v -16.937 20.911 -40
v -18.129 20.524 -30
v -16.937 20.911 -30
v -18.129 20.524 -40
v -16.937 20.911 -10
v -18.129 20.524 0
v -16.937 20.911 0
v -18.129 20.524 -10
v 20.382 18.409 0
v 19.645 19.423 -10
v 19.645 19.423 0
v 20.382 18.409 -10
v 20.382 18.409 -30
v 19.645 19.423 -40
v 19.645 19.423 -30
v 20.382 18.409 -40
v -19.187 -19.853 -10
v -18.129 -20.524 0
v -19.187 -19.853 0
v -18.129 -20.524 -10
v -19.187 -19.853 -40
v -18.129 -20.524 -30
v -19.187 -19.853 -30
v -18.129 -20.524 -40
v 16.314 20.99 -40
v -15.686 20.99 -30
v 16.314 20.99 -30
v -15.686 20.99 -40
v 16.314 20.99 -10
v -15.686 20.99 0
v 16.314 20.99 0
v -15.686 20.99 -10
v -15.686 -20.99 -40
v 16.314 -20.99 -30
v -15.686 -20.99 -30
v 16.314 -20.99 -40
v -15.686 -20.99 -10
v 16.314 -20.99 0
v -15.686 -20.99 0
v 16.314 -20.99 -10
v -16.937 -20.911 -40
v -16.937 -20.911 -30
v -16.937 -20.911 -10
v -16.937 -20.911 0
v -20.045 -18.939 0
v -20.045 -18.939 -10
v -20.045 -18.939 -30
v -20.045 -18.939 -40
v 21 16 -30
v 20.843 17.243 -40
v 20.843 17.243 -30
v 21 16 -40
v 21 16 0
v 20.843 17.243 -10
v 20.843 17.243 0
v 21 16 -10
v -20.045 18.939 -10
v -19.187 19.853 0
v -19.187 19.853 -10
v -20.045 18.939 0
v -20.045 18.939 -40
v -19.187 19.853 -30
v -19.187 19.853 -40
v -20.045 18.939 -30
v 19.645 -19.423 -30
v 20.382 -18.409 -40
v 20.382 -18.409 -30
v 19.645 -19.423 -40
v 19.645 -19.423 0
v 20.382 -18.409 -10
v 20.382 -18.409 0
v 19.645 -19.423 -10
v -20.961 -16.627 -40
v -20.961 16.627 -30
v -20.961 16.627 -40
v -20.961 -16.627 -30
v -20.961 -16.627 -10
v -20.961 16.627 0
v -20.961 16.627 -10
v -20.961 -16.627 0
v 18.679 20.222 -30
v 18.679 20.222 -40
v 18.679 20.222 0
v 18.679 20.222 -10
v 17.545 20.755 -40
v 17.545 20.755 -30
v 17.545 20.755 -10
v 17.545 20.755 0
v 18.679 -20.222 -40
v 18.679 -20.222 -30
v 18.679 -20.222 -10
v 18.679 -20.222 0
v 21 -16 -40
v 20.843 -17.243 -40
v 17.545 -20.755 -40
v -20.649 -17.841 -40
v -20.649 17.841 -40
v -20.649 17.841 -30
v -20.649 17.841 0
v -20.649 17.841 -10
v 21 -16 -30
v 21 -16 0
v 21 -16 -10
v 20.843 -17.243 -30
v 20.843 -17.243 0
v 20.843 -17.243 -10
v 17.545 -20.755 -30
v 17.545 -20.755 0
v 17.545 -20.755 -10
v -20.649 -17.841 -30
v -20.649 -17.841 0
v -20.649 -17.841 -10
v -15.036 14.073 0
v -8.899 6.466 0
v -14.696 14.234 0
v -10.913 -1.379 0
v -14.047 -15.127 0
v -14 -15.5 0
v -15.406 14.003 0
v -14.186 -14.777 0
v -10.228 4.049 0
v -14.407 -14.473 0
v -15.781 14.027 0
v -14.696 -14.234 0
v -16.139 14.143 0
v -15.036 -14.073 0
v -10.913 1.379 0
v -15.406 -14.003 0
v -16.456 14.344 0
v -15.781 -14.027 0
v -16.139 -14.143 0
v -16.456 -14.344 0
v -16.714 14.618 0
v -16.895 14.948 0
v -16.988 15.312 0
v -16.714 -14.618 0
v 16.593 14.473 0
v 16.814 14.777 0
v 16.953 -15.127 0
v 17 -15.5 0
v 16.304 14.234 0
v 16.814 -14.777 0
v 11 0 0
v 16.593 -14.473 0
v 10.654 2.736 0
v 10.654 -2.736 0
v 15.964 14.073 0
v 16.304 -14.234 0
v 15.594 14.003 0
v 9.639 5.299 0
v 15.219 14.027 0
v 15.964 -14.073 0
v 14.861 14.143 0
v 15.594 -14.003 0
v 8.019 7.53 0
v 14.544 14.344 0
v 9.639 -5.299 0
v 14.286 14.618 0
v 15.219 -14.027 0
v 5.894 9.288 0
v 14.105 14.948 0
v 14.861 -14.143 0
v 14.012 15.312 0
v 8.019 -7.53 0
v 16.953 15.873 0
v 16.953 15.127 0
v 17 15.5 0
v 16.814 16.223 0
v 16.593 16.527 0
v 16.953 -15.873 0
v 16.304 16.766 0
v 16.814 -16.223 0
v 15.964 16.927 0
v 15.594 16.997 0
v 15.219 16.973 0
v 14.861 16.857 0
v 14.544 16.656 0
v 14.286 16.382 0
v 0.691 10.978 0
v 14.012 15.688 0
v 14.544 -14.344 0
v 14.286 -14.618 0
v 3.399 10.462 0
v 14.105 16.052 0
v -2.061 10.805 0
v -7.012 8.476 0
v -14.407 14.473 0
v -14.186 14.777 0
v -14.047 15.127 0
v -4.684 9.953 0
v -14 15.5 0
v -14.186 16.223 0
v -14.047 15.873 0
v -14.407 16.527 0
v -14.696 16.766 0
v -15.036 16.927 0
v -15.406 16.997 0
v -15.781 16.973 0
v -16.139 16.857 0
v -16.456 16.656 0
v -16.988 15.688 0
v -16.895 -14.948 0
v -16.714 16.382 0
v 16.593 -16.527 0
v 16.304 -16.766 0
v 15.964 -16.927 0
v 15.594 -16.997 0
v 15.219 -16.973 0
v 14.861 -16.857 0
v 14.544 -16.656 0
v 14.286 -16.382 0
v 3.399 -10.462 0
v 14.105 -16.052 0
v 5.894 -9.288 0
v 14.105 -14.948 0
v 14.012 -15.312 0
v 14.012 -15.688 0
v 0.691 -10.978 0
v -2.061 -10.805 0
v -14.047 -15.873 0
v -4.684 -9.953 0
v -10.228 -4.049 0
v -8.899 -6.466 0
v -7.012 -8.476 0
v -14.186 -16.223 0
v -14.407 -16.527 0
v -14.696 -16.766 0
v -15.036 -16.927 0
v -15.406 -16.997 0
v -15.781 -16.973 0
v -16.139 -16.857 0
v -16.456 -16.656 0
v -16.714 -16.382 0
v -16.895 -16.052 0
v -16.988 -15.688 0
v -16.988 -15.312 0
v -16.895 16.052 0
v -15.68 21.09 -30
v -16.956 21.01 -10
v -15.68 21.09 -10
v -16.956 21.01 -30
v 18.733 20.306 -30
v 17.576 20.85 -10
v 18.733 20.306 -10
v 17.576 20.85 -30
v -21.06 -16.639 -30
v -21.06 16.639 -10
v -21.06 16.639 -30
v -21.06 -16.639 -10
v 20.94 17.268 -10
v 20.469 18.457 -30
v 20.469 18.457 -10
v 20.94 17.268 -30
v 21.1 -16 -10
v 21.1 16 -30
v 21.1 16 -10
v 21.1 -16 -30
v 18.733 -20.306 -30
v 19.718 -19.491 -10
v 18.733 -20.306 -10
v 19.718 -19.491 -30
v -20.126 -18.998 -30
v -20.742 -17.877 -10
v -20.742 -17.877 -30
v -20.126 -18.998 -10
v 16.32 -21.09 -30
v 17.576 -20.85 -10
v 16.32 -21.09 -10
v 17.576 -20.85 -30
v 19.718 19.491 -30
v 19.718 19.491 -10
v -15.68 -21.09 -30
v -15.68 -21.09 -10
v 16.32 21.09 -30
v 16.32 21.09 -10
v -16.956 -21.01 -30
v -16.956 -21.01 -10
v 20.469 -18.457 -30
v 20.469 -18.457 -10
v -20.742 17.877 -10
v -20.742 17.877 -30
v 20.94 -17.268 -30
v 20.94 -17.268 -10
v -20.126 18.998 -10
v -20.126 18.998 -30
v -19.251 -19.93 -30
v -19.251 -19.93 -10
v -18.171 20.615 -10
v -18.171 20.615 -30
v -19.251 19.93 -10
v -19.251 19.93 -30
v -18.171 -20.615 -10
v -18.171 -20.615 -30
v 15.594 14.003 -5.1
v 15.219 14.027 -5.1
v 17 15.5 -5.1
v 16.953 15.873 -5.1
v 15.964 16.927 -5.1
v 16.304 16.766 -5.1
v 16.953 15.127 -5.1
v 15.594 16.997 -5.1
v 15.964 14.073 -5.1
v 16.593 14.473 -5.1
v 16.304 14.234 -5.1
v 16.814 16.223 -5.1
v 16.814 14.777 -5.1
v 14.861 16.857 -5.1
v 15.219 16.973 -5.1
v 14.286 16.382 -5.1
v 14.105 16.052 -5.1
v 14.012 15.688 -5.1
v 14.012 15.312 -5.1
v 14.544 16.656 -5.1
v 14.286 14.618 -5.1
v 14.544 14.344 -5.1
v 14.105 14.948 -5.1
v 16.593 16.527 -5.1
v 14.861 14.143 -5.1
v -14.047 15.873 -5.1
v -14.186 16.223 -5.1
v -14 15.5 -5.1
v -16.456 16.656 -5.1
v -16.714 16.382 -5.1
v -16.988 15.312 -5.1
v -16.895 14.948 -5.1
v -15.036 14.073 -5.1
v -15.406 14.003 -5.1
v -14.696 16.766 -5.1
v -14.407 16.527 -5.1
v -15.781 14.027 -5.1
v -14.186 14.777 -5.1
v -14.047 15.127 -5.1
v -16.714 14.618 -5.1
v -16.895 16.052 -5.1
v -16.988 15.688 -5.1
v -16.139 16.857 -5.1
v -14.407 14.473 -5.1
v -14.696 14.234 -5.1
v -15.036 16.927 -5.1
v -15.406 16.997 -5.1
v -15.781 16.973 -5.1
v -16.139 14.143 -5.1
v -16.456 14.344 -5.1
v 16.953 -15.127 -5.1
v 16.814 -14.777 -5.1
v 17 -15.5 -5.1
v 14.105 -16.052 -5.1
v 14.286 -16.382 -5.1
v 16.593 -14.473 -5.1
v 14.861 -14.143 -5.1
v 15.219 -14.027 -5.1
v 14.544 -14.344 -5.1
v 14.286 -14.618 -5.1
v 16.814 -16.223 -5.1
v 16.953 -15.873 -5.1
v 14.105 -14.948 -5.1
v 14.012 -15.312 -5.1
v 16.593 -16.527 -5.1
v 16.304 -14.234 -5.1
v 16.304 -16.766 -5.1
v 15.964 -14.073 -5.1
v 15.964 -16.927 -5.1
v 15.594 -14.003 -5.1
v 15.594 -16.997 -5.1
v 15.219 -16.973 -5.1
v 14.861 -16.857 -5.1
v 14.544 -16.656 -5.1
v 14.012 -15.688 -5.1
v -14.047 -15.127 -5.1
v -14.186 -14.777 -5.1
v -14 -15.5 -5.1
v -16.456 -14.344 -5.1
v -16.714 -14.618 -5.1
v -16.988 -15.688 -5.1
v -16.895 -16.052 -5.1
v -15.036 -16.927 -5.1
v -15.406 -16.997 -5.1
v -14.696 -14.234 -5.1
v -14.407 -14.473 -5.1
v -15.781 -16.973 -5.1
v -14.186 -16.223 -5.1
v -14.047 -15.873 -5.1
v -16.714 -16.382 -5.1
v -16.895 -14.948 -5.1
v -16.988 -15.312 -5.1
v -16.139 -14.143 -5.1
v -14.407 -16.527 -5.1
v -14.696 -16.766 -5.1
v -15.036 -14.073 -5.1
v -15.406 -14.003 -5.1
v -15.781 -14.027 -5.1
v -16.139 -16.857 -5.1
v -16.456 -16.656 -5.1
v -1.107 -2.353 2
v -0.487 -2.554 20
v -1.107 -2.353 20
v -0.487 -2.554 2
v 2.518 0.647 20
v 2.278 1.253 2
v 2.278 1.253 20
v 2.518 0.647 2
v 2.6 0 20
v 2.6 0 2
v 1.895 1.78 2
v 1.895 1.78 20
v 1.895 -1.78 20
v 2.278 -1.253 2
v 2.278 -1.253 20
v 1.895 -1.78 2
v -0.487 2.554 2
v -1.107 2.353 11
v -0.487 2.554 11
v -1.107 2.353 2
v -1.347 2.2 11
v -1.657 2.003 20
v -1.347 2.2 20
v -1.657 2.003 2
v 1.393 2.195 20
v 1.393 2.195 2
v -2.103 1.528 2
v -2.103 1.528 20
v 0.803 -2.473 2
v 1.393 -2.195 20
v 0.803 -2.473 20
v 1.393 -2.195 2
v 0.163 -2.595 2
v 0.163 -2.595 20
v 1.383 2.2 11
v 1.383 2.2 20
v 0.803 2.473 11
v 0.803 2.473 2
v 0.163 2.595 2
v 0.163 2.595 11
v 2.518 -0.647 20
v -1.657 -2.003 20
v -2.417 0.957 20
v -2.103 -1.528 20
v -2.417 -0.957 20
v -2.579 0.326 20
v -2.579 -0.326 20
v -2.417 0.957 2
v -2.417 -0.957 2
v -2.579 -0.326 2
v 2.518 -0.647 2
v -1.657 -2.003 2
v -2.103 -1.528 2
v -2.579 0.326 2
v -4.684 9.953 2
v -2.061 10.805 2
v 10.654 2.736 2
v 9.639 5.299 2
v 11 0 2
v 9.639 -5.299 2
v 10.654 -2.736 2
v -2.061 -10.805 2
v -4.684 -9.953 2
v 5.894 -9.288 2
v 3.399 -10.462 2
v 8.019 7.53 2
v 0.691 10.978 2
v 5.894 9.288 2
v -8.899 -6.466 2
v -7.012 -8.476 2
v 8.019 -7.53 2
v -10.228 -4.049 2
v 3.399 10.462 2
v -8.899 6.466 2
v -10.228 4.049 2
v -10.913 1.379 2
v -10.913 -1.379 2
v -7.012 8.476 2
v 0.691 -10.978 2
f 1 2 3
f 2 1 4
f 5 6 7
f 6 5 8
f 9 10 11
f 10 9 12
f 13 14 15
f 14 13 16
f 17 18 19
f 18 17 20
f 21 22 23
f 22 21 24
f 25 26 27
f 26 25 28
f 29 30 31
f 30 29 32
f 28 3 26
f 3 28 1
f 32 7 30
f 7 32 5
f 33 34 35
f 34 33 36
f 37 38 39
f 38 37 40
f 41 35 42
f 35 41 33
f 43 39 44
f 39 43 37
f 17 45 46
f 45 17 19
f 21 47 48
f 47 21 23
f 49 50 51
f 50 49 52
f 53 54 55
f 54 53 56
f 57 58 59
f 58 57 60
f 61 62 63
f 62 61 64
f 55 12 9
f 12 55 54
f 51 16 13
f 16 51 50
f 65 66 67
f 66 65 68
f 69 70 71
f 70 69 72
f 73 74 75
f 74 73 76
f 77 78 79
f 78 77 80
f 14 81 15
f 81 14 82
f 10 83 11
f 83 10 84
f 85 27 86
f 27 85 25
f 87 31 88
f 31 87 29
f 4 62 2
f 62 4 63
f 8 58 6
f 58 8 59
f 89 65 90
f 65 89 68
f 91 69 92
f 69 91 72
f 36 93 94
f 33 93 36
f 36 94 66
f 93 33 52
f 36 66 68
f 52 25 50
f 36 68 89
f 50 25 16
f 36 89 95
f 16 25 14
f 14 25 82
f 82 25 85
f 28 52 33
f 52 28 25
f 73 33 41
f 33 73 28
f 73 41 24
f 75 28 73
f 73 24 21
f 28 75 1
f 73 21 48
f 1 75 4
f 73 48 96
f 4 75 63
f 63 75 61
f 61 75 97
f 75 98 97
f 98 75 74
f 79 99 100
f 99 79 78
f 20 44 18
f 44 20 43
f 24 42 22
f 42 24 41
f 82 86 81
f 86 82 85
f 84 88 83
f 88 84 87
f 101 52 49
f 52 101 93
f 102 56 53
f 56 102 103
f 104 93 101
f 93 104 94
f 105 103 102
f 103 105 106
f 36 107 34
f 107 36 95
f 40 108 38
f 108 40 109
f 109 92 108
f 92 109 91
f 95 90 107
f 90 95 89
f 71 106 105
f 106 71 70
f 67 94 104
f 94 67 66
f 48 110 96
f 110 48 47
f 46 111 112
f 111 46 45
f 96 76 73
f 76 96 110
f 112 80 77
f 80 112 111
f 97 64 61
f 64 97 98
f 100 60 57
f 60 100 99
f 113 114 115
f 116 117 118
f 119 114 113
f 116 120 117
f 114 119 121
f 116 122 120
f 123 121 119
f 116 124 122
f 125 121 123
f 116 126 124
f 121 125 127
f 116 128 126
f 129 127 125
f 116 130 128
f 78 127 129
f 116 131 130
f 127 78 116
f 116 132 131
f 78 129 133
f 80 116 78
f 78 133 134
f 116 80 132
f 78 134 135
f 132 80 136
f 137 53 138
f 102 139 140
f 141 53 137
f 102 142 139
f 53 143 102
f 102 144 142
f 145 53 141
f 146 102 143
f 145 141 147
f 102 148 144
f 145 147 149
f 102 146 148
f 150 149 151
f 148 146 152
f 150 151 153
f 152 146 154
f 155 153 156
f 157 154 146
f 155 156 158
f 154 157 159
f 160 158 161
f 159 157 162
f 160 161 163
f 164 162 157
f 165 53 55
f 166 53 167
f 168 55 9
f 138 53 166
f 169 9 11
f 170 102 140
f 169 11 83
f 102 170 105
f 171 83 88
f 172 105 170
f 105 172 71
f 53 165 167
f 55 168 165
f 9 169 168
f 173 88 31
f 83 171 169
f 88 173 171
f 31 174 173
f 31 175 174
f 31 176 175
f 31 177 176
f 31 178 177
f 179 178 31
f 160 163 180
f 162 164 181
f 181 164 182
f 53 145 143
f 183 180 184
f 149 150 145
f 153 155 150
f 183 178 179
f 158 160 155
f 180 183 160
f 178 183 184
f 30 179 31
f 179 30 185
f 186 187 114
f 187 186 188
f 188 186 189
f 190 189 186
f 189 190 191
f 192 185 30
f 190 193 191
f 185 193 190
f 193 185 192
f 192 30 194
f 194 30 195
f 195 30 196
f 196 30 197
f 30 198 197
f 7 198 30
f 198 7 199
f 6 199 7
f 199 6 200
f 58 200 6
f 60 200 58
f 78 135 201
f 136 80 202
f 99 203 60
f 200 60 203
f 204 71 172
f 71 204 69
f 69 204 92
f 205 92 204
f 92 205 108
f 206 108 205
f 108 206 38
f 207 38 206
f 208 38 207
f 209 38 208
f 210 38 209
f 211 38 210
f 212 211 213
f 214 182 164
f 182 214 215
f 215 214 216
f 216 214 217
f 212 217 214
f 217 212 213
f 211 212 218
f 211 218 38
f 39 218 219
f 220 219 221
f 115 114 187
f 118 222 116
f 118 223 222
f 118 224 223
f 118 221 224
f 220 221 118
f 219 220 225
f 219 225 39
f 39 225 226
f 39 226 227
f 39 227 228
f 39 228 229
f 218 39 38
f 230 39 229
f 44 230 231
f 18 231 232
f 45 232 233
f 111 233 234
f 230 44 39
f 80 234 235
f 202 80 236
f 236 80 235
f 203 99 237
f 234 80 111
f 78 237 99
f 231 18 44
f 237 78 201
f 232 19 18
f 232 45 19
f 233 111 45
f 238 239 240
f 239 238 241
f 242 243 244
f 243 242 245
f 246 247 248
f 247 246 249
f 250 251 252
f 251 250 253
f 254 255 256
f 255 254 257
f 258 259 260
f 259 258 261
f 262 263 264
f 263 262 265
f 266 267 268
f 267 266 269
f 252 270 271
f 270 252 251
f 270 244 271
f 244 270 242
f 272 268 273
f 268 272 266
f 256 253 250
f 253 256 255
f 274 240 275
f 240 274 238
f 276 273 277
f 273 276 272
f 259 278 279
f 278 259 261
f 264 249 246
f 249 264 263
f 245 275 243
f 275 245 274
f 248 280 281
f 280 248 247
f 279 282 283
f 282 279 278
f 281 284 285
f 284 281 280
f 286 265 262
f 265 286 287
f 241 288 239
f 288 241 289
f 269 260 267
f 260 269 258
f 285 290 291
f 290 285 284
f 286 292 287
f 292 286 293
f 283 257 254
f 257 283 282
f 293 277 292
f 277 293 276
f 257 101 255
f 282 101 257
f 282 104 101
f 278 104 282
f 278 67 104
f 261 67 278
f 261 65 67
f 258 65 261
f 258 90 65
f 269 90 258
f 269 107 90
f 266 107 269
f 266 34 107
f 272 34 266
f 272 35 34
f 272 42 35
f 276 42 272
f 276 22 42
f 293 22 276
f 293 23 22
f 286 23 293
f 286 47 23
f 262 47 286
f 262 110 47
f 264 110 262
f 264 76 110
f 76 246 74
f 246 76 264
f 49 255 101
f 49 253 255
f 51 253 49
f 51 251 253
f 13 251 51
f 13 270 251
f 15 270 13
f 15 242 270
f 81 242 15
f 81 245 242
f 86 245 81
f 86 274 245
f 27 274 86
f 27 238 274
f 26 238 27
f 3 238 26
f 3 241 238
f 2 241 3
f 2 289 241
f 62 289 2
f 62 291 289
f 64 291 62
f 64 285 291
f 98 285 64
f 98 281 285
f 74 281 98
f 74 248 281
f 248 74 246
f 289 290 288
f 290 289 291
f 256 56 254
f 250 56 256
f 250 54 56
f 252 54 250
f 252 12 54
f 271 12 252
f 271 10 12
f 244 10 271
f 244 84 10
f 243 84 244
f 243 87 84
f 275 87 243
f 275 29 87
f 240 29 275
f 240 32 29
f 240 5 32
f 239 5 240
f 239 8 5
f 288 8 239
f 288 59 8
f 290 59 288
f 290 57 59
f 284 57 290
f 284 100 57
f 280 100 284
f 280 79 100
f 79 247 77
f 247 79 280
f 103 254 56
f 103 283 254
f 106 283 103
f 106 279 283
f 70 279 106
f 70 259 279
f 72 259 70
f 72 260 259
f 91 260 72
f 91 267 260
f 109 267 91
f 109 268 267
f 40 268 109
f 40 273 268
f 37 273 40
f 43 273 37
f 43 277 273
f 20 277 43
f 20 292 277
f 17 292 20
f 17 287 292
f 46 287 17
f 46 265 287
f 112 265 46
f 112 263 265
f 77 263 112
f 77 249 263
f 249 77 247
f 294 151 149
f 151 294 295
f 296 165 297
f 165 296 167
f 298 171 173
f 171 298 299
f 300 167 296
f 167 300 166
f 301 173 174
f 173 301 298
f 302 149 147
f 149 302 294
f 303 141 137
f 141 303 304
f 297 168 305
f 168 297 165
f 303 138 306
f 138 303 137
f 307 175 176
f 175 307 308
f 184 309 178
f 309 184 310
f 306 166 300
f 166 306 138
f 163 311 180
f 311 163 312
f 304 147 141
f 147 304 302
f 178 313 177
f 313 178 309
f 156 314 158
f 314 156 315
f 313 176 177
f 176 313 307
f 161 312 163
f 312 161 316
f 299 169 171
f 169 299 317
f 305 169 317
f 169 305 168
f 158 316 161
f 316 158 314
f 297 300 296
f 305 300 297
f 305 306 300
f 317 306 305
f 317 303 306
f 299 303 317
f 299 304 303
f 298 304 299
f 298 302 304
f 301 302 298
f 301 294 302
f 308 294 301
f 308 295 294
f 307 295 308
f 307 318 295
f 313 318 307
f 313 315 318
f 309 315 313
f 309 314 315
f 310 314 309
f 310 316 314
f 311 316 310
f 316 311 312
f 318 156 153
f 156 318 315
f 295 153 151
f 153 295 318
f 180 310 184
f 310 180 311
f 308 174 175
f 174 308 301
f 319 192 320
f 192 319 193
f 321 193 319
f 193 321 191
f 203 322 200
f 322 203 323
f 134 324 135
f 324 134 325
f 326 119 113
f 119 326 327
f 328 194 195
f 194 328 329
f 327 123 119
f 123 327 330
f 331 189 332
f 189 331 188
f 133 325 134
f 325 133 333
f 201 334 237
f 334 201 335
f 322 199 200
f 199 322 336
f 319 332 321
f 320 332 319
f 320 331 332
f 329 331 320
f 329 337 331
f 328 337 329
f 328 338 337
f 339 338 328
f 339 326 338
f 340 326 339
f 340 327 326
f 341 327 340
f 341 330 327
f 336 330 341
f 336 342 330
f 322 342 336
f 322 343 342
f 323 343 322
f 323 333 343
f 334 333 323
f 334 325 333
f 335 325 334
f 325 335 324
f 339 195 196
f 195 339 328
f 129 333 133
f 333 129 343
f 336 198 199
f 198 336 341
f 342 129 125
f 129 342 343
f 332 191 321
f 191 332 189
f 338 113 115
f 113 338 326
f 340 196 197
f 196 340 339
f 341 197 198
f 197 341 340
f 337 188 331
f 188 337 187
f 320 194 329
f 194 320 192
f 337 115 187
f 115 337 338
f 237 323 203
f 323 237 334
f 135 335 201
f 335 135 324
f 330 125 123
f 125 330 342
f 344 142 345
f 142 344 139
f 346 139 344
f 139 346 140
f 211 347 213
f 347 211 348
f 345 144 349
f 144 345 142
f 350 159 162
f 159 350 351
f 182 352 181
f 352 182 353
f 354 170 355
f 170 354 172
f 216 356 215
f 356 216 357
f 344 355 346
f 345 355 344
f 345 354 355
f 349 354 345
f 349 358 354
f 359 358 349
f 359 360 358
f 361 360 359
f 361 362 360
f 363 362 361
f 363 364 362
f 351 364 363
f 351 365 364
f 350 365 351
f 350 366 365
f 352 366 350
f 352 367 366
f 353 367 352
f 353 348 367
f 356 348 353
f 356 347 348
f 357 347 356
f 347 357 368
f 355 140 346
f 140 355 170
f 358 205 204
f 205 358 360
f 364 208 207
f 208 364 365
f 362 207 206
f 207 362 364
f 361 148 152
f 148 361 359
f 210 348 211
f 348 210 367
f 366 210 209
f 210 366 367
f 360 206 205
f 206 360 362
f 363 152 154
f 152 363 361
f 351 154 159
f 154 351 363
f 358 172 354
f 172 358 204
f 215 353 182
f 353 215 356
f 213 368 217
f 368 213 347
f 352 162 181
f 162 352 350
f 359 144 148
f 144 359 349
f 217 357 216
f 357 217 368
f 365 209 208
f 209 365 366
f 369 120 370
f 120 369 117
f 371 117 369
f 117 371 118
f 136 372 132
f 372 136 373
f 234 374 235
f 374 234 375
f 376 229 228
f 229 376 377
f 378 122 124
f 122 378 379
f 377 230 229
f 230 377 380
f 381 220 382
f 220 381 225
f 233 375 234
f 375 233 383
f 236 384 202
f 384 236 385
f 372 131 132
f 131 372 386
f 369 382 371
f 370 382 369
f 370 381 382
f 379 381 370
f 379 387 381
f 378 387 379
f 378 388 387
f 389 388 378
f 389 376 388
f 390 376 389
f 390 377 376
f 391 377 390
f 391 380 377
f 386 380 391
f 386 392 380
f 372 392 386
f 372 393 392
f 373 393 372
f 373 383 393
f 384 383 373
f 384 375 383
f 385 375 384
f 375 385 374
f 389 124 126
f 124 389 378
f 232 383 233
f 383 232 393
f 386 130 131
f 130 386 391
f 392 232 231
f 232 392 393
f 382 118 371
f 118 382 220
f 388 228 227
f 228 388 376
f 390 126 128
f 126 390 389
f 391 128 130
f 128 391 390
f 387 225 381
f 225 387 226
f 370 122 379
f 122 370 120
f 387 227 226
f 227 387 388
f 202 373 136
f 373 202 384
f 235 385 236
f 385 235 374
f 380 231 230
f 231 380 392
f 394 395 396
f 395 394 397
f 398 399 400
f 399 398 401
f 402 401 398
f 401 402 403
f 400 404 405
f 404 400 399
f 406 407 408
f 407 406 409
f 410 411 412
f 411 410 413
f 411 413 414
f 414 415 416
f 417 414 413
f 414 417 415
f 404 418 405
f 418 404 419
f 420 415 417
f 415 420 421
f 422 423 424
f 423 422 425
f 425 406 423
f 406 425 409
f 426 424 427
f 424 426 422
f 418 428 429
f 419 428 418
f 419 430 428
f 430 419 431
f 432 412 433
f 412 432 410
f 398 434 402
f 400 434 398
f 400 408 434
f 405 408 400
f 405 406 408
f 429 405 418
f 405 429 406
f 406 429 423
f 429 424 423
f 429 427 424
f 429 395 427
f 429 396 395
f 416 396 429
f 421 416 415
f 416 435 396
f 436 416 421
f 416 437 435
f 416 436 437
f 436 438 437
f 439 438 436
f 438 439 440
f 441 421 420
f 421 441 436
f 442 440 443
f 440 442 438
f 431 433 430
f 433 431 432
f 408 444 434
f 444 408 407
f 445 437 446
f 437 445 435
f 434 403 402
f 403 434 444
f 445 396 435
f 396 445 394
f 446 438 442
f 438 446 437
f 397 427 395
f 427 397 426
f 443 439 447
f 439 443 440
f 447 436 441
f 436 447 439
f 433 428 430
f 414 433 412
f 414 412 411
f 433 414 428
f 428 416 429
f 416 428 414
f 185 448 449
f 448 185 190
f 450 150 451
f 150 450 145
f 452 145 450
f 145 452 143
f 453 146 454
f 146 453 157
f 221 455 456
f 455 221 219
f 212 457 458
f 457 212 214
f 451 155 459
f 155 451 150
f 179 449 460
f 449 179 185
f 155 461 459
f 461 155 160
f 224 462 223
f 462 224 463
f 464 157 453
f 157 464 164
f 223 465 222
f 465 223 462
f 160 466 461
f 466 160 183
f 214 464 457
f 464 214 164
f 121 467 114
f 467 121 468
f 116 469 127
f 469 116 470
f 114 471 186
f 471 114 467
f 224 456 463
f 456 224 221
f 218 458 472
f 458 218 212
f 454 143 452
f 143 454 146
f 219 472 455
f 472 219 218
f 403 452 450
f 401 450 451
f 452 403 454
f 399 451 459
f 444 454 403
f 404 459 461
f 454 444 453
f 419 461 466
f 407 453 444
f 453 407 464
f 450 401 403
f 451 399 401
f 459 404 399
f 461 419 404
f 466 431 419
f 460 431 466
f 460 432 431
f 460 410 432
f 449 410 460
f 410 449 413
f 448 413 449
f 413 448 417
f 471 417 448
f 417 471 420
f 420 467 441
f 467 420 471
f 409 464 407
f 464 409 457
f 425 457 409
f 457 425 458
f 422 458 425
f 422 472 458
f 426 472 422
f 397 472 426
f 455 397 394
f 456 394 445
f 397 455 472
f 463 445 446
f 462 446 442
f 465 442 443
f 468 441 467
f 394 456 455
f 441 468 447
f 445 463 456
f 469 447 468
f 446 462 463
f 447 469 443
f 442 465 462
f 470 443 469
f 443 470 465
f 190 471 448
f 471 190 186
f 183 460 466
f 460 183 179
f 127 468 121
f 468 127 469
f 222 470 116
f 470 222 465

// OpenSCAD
$fn=25;

module nema17(motor_height = 40, shaft_diameter = 5.2, shaft_flat = 0.2)
{
    rotate(a=90, v=[-1,0,0])
    nema(motor_size = 42, motor_height = 40, shaft_diameter = 5.2, shaft_flat = 0.2);
}

nema17();

module nema(motor_size=42, motor_height = 38, shaft_diameter = 5.2, shaft_flat = 0.2) {
	difference() {

    union()
    {
        color("silver")
        // Motor base
		translate([0,motor_height/2,0]) rotate([90,0,0]) hull() {
			translate([-(motor_size/2-5),(motor_size/2-5),0]) cylinder(r=5,h=motor_height, center = true);
			translate([(motor_size/2-5),(motor_size/2-5),0]) cylinder(r=5,h=motor_height, center = true);
			translate([-(motor_size/2-5),-(motor_size/2-5),0]) cylinder(r=5,h=motor_height, center = true);
			translate([(motor_size/2-5),-(motor_size/2-5),0]) cylinder(r=5,h=motor_height, center = true);
		}
        color("black")
        translate([0,motor_height/2,0]) rotate([90,0,0]) hull() {
            translate([-(motor_size/2-5),(motor_size/2-5),0]) cylinder(r=5.1,h=motor_height/2, center = true);
            translate([(motor_size/2-5),(motor_size/2-5),0]) cylinder(r=5.1,h=motor_height/2, center = true);
            translate([-(motor_size/2-5),-(motor_size/2-5),0]) cylinder(r=5.1,h=motor_height/2, center = true);
            translate([(motor_size/2-5),-(motor_size/2-5),0]) cylinder(r=5.1,h=motor_height/2, center = true);
        }
    }


        // Mount holes
        union() {
		translate([15.5,0.1,15.5]) rotate([90,0,0]) cylinder(r=1.5,h=10, center = true);
		translate([-15.5,0.1,15.5]) rotate([90,0,0]) cylinder(r=1.5,h=10, center = true);
		translate([15.5,0.1,-15.5]) rotate([90,0,0]) cylinder(r=1.5,h=10, center = true);
		translate([-15.5,0.1,-15.5]) rotate([90,0,0]) cylinder(r=1.5,h=10, center = true);
        }
	}
    color("silver")
    // Motor shaft
	translate([0,-10,0]) rotate([90,0,0])
    difference() {    
        cylinder(r=shaft_diameter/2,h=20, center = true); 
        translate([-shaft_diameter/2,(shaft_diameter/2)-shaft_flat*2,1])
        cube([shaft_diameter,shaft_diameter/2,10]);
    }
    color("gray")
    // The ring around the motor shaft
//	difference() {
		translate([0,-1,0]) rotate([90,0,0]) cylinder(r=11,h=2, center = true);
//		translate([0,-1.1,0]) rotate([90,0,0]) cylinder(r=9.05,h=2, center = true);
//	}
}

module nema_holes(places=[1,1,1,1], size=15.5, h=10, holes=false, shadow=false, $fn=8){
    for (i=[0:3]) {
        if (places[i] == 1) {
            rotate([0, 0, 90*i]) translate([size, size, 0]) {
                if (holes) {
                    rotate([0, 0, -90*i]) translate([0,0,0]) rotate([0,0,90]) cylinder_poly(h = h+0.1, r = M3/2);
					rotate([0, 0, -90*i]) translate([0,0,h]) rotate([0,0,22.5]) cylinder(h = h, r = M3*2.2/2, $fn = $fn);
                } else {
                    rotate([0, 0, -90*i]) cylinder(h=h, r=4, $fn=$fn);
                }
            }
        }
    }
    if (shadow != false) {
        %translate ([0, 0, -19]) cube([42,42,38], center = true);
    //flange
        translate ([0, 0, 0]) cylinder(r=22.6/2,h=h*2, center = false, $fn=20);
    //shaft
        %translate ([0, 0, 0]) cylinder(r=2.5,h=14, center = false);
    }
}
